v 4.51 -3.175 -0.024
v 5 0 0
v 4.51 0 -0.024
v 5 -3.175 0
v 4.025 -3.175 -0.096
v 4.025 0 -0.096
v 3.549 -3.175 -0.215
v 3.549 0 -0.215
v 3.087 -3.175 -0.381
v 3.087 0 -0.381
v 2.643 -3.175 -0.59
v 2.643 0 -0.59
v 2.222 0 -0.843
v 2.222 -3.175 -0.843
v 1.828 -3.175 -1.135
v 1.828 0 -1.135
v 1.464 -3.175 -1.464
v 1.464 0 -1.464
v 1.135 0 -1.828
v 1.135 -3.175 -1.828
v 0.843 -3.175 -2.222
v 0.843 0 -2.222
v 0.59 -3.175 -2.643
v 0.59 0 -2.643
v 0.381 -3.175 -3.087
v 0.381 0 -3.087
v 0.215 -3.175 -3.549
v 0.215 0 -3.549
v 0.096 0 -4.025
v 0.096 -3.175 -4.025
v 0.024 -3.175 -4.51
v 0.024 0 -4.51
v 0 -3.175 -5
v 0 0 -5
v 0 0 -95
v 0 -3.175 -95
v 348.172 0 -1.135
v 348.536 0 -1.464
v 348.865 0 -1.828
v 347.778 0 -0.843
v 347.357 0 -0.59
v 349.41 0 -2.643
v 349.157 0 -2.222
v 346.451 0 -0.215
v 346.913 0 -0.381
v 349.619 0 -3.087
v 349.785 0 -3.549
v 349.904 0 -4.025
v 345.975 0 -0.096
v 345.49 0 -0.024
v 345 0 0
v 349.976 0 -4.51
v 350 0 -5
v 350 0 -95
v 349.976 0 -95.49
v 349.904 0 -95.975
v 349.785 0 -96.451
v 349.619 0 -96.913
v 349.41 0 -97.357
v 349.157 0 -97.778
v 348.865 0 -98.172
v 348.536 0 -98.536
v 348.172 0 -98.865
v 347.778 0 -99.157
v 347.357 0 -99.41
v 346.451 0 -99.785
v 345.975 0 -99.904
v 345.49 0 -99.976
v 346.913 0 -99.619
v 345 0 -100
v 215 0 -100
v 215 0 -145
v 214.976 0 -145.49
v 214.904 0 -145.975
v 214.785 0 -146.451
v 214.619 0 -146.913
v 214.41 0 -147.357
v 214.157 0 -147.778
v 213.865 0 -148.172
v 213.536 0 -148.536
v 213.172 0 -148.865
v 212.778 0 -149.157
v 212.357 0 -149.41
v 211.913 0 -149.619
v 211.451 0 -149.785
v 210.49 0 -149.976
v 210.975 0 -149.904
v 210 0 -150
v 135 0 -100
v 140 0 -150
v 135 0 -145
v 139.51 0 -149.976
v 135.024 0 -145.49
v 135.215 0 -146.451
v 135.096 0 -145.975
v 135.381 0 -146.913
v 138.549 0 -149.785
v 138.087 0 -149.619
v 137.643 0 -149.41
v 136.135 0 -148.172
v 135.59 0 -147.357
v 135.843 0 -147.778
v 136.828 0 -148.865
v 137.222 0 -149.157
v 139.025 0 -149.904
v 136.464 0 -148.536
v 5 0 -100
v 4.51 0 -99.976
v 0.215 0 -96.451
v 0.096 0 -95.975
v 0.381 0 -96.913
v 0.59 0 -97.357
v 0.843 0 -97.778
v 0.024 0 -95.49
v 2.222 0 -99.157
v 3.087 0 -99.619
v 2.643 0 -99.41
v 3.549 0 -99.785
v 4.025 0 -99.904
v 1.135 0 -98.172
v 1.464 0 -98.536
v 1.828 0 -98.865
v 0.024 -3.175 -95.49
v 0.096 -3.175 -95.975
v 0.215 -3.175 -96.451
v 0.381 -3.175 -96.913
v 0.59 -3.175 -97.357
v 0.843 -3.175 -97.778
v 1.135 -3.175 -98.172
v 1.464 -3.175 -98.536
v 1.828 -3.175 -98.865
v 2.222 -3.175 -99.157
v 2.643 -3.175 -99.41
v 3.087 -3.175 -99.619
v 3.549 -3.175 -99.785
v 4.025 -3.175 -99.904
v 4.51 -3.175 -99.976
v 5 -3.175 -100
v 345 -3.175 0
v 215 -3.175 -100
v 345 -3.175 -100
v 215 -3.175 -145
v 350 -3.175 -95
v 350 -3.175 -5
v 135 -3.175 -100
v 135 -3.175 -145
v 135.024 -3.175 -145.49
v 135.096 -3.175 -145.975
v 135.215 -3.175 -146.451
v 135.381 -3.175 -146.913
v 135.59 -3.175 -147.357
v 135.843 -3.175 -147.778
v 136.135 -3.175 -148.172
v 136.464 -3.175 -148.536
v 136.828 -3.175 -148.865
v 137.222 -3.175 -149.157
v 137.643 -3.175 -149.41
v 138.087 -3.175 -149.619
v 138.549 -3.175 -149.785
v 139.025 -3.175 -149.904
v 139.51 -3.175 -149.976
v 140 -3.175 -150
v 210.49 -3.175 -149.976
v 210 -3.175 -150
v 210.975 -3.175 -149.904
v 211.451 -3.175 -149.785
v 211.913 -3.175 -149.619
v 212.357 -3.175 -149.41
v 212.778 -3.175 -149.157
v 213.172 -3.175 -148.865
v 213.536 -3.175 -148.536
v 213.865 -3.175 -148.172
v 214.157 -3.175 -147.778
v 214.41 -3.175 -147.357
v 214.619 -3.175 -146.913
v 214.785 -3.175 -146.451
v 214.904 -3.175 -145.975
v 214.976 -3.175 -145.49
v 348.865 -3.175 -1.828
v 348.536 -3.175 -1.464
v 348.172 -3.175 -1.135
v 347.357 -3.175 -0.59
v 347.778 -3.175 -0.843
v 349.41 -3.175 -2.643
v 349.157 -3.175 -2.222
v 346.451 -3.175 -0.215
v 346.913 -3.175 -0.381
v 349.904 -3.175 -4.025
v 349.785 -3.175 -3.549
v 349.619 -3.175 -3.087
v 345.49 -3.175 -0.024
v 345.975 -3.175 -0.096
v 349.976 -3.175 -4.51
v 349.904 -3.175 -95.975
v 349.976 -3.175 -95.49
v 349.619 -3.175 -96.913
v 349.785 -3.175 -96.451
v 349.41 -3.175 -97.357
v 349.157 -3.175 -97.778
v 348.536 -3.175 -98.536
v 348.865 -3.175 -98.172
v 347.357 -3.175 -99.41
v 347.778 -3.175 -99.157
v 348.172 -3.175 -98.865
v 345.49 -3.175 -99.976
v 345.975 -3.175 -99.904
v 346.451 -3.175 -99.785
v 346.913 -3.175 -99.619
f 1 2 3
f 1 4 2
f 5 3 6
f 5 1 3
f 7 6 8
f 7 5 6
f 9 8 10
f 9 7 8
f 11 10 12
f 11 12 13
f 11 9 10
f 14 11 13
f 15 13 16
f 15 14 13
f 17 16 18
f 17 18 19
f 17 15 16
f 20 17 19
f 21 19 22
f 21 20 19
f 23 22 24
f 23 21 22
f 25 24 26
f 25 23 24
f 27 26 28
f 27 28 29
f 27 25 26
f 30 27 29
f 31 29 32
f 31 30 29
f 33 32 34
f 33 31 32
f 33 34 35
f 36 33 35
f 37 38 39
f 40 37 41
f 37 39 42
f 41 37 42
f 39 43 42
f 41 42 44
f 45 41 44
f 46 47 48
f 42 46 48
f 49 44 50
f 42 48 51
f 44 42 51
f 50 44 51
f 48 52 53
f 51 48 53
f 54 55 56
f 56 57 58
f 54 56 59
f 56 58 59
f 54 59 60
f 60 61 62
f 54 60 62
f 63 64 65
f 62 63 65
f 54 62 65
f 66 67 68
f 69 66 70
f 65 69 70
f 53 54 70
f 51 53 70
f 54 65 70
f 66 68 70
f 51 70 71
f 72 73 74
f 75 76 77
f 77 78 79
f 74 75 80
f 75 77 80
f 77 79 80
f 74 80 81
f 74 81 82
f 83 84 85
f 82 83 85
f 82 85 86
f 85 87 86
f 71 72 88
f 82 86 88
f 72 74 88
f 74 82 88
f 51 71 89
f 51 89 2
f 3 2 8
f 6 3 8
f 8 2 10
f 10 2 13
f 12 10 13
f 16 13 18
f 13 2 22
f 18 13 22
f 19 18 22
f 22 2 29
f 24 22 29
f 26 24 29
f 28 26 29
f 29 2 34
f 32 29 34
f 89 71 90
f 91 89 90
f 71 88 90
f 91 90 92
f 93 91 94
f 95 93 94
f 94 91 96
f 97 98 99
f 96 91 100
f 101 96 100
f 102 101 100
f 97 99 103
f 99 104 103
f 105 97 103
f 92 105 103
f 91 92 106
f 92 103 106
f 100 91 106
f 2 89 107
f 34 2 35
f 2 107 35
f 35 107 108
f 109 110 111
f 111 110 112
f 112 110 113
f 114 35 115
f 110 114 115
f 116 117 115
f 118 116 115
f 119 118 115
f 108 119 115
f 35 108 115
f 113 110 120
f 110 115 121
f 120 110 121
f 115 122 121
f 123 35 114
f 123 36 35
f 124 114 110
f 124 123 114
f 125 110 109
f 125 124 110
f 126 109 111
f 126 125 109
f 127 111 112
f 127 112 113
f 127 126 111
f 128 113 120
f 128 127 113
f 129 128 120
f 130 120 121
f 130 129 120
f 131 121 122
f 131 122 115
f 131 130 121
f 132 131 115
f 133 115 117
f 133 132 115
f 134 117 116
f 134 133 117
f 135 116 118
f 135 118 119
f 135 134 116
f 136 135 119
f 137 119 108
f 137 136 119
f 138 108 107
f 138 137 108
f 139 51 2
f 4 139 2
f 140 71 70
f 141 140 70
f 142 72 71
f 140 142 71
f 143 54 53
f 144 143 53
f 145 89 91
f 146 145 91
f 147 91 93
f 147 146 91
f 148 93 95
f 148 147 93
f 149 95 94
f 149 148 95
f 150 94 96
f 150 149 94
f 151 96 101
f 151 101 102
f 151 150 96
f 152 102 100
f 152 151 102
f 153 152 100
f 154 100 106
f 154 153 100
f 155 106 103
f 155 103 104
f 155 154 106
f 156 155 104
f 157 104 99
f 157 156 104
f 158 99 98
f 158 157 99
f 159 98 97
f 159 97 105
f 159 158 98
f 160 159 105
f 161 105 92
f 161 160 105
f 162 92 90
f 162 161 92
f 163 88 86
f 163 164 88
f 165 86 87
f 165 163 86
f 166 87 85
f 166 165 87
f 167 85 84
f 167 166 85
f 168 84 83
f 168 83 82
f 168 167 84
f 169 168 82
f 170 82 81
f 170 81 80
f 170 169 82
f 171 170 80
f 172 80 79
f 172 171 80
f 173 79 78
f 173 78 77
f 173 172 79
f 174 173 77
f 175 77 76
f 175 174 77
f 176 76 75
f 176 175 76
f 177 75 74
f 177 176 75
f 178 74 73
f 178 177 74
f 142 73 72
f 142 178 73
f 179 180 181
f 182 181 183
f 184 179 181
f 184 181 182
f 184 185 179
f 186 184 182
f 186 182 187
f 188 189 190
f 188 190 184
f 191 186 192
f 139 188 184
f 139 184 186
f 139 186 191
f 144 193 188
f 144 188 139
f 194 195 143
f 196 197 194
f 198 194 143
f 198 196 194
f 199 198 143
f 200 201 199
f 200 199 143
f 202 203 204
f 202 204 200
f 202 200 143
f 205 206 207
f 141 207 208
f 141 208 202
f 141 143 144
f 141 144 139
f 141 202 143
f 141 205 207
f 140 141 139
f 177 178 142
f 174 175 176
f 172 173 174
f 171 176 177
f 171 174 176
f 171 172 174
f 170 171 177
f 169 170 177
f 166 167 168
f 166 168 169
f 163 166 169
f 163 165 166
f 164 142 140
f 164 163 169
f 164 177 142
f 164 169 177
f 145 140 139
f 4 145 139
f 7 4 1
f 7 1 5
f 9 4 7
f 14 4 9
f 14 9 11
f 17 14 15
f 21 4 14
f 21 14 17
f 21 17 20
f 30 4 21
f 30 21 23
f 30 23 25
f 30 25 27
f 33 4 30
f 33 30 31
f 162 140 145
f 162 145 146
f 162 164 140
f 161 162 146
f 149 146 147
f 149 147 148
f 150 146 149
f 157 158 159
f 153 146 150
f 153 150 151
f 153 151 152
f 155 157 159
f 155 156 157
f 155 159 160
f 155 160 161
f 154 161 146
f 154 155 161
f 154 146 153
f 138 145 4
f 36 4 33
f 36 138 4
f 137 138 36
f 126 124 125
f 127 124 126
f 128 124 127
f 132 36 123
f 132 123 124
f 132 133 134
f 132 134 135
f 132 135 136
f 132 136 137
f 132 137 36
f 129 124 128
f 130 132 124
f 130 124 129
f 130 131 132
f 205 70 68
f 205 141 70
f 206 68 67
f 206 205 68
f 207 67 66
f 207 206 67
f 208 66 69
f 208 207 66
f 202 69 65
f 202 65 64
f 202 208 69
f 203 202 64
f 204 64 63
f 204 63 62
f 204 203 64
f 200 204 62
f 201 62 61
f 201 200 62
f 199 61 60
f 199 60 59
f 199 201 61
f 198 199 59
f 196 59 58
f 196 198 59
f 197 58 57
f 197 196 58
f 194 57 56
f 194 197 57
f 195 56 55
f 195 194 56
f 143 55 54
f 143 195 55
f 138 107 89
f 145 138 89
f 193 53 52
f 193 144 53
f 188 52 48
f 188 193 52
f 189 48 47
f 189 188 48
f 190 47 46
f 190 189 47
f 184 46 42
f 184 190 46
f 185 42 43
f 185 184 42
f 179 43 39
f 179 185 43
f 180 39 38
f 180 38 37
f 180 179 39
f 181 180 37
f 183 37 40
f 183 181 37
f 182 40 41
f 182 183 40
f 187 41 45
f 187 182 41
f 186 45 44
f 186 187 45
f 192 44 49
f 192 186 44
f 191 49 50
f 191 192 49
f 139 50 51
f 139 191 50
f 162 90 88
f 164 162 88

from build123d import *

# Parameters (mm, degrees)
BASE_FLANGE1_DEPTH = 3.175
FILLET1_R          = 5


# Sheet-metal steps are written as plain solids
with BuildPart() as part:
    # Sketch1 → Base-Flange1 (new body)
    with BuildSketch(Plane(origin=(0, 0, 0), x_dir=(1, 0, 0), z_dir=(0, 1, 0))):
        Polygon((215, 100), (350, 100), (350, 0), (0, 0), (0, 100), (135, 100), (135, 150), (215, 150), align=None)
    extrude(amount=-BASE_FLANGE1_DEPTH)

    # Fillet1
    fillet1_edges = [part.edges().sort_by_distance(p)[0] for p in [
        (0, -1.5875, -100),
        (135, -1.5875, -150),
        (215, -1.5875, -150),
        (350, -1.5875, -100),
        (350, -1.5875, 0),
        (0, -1.5875, 0),
    ]]
    fillet(fillet1_edges, radius=FILLET1_R)


solid = part.part
